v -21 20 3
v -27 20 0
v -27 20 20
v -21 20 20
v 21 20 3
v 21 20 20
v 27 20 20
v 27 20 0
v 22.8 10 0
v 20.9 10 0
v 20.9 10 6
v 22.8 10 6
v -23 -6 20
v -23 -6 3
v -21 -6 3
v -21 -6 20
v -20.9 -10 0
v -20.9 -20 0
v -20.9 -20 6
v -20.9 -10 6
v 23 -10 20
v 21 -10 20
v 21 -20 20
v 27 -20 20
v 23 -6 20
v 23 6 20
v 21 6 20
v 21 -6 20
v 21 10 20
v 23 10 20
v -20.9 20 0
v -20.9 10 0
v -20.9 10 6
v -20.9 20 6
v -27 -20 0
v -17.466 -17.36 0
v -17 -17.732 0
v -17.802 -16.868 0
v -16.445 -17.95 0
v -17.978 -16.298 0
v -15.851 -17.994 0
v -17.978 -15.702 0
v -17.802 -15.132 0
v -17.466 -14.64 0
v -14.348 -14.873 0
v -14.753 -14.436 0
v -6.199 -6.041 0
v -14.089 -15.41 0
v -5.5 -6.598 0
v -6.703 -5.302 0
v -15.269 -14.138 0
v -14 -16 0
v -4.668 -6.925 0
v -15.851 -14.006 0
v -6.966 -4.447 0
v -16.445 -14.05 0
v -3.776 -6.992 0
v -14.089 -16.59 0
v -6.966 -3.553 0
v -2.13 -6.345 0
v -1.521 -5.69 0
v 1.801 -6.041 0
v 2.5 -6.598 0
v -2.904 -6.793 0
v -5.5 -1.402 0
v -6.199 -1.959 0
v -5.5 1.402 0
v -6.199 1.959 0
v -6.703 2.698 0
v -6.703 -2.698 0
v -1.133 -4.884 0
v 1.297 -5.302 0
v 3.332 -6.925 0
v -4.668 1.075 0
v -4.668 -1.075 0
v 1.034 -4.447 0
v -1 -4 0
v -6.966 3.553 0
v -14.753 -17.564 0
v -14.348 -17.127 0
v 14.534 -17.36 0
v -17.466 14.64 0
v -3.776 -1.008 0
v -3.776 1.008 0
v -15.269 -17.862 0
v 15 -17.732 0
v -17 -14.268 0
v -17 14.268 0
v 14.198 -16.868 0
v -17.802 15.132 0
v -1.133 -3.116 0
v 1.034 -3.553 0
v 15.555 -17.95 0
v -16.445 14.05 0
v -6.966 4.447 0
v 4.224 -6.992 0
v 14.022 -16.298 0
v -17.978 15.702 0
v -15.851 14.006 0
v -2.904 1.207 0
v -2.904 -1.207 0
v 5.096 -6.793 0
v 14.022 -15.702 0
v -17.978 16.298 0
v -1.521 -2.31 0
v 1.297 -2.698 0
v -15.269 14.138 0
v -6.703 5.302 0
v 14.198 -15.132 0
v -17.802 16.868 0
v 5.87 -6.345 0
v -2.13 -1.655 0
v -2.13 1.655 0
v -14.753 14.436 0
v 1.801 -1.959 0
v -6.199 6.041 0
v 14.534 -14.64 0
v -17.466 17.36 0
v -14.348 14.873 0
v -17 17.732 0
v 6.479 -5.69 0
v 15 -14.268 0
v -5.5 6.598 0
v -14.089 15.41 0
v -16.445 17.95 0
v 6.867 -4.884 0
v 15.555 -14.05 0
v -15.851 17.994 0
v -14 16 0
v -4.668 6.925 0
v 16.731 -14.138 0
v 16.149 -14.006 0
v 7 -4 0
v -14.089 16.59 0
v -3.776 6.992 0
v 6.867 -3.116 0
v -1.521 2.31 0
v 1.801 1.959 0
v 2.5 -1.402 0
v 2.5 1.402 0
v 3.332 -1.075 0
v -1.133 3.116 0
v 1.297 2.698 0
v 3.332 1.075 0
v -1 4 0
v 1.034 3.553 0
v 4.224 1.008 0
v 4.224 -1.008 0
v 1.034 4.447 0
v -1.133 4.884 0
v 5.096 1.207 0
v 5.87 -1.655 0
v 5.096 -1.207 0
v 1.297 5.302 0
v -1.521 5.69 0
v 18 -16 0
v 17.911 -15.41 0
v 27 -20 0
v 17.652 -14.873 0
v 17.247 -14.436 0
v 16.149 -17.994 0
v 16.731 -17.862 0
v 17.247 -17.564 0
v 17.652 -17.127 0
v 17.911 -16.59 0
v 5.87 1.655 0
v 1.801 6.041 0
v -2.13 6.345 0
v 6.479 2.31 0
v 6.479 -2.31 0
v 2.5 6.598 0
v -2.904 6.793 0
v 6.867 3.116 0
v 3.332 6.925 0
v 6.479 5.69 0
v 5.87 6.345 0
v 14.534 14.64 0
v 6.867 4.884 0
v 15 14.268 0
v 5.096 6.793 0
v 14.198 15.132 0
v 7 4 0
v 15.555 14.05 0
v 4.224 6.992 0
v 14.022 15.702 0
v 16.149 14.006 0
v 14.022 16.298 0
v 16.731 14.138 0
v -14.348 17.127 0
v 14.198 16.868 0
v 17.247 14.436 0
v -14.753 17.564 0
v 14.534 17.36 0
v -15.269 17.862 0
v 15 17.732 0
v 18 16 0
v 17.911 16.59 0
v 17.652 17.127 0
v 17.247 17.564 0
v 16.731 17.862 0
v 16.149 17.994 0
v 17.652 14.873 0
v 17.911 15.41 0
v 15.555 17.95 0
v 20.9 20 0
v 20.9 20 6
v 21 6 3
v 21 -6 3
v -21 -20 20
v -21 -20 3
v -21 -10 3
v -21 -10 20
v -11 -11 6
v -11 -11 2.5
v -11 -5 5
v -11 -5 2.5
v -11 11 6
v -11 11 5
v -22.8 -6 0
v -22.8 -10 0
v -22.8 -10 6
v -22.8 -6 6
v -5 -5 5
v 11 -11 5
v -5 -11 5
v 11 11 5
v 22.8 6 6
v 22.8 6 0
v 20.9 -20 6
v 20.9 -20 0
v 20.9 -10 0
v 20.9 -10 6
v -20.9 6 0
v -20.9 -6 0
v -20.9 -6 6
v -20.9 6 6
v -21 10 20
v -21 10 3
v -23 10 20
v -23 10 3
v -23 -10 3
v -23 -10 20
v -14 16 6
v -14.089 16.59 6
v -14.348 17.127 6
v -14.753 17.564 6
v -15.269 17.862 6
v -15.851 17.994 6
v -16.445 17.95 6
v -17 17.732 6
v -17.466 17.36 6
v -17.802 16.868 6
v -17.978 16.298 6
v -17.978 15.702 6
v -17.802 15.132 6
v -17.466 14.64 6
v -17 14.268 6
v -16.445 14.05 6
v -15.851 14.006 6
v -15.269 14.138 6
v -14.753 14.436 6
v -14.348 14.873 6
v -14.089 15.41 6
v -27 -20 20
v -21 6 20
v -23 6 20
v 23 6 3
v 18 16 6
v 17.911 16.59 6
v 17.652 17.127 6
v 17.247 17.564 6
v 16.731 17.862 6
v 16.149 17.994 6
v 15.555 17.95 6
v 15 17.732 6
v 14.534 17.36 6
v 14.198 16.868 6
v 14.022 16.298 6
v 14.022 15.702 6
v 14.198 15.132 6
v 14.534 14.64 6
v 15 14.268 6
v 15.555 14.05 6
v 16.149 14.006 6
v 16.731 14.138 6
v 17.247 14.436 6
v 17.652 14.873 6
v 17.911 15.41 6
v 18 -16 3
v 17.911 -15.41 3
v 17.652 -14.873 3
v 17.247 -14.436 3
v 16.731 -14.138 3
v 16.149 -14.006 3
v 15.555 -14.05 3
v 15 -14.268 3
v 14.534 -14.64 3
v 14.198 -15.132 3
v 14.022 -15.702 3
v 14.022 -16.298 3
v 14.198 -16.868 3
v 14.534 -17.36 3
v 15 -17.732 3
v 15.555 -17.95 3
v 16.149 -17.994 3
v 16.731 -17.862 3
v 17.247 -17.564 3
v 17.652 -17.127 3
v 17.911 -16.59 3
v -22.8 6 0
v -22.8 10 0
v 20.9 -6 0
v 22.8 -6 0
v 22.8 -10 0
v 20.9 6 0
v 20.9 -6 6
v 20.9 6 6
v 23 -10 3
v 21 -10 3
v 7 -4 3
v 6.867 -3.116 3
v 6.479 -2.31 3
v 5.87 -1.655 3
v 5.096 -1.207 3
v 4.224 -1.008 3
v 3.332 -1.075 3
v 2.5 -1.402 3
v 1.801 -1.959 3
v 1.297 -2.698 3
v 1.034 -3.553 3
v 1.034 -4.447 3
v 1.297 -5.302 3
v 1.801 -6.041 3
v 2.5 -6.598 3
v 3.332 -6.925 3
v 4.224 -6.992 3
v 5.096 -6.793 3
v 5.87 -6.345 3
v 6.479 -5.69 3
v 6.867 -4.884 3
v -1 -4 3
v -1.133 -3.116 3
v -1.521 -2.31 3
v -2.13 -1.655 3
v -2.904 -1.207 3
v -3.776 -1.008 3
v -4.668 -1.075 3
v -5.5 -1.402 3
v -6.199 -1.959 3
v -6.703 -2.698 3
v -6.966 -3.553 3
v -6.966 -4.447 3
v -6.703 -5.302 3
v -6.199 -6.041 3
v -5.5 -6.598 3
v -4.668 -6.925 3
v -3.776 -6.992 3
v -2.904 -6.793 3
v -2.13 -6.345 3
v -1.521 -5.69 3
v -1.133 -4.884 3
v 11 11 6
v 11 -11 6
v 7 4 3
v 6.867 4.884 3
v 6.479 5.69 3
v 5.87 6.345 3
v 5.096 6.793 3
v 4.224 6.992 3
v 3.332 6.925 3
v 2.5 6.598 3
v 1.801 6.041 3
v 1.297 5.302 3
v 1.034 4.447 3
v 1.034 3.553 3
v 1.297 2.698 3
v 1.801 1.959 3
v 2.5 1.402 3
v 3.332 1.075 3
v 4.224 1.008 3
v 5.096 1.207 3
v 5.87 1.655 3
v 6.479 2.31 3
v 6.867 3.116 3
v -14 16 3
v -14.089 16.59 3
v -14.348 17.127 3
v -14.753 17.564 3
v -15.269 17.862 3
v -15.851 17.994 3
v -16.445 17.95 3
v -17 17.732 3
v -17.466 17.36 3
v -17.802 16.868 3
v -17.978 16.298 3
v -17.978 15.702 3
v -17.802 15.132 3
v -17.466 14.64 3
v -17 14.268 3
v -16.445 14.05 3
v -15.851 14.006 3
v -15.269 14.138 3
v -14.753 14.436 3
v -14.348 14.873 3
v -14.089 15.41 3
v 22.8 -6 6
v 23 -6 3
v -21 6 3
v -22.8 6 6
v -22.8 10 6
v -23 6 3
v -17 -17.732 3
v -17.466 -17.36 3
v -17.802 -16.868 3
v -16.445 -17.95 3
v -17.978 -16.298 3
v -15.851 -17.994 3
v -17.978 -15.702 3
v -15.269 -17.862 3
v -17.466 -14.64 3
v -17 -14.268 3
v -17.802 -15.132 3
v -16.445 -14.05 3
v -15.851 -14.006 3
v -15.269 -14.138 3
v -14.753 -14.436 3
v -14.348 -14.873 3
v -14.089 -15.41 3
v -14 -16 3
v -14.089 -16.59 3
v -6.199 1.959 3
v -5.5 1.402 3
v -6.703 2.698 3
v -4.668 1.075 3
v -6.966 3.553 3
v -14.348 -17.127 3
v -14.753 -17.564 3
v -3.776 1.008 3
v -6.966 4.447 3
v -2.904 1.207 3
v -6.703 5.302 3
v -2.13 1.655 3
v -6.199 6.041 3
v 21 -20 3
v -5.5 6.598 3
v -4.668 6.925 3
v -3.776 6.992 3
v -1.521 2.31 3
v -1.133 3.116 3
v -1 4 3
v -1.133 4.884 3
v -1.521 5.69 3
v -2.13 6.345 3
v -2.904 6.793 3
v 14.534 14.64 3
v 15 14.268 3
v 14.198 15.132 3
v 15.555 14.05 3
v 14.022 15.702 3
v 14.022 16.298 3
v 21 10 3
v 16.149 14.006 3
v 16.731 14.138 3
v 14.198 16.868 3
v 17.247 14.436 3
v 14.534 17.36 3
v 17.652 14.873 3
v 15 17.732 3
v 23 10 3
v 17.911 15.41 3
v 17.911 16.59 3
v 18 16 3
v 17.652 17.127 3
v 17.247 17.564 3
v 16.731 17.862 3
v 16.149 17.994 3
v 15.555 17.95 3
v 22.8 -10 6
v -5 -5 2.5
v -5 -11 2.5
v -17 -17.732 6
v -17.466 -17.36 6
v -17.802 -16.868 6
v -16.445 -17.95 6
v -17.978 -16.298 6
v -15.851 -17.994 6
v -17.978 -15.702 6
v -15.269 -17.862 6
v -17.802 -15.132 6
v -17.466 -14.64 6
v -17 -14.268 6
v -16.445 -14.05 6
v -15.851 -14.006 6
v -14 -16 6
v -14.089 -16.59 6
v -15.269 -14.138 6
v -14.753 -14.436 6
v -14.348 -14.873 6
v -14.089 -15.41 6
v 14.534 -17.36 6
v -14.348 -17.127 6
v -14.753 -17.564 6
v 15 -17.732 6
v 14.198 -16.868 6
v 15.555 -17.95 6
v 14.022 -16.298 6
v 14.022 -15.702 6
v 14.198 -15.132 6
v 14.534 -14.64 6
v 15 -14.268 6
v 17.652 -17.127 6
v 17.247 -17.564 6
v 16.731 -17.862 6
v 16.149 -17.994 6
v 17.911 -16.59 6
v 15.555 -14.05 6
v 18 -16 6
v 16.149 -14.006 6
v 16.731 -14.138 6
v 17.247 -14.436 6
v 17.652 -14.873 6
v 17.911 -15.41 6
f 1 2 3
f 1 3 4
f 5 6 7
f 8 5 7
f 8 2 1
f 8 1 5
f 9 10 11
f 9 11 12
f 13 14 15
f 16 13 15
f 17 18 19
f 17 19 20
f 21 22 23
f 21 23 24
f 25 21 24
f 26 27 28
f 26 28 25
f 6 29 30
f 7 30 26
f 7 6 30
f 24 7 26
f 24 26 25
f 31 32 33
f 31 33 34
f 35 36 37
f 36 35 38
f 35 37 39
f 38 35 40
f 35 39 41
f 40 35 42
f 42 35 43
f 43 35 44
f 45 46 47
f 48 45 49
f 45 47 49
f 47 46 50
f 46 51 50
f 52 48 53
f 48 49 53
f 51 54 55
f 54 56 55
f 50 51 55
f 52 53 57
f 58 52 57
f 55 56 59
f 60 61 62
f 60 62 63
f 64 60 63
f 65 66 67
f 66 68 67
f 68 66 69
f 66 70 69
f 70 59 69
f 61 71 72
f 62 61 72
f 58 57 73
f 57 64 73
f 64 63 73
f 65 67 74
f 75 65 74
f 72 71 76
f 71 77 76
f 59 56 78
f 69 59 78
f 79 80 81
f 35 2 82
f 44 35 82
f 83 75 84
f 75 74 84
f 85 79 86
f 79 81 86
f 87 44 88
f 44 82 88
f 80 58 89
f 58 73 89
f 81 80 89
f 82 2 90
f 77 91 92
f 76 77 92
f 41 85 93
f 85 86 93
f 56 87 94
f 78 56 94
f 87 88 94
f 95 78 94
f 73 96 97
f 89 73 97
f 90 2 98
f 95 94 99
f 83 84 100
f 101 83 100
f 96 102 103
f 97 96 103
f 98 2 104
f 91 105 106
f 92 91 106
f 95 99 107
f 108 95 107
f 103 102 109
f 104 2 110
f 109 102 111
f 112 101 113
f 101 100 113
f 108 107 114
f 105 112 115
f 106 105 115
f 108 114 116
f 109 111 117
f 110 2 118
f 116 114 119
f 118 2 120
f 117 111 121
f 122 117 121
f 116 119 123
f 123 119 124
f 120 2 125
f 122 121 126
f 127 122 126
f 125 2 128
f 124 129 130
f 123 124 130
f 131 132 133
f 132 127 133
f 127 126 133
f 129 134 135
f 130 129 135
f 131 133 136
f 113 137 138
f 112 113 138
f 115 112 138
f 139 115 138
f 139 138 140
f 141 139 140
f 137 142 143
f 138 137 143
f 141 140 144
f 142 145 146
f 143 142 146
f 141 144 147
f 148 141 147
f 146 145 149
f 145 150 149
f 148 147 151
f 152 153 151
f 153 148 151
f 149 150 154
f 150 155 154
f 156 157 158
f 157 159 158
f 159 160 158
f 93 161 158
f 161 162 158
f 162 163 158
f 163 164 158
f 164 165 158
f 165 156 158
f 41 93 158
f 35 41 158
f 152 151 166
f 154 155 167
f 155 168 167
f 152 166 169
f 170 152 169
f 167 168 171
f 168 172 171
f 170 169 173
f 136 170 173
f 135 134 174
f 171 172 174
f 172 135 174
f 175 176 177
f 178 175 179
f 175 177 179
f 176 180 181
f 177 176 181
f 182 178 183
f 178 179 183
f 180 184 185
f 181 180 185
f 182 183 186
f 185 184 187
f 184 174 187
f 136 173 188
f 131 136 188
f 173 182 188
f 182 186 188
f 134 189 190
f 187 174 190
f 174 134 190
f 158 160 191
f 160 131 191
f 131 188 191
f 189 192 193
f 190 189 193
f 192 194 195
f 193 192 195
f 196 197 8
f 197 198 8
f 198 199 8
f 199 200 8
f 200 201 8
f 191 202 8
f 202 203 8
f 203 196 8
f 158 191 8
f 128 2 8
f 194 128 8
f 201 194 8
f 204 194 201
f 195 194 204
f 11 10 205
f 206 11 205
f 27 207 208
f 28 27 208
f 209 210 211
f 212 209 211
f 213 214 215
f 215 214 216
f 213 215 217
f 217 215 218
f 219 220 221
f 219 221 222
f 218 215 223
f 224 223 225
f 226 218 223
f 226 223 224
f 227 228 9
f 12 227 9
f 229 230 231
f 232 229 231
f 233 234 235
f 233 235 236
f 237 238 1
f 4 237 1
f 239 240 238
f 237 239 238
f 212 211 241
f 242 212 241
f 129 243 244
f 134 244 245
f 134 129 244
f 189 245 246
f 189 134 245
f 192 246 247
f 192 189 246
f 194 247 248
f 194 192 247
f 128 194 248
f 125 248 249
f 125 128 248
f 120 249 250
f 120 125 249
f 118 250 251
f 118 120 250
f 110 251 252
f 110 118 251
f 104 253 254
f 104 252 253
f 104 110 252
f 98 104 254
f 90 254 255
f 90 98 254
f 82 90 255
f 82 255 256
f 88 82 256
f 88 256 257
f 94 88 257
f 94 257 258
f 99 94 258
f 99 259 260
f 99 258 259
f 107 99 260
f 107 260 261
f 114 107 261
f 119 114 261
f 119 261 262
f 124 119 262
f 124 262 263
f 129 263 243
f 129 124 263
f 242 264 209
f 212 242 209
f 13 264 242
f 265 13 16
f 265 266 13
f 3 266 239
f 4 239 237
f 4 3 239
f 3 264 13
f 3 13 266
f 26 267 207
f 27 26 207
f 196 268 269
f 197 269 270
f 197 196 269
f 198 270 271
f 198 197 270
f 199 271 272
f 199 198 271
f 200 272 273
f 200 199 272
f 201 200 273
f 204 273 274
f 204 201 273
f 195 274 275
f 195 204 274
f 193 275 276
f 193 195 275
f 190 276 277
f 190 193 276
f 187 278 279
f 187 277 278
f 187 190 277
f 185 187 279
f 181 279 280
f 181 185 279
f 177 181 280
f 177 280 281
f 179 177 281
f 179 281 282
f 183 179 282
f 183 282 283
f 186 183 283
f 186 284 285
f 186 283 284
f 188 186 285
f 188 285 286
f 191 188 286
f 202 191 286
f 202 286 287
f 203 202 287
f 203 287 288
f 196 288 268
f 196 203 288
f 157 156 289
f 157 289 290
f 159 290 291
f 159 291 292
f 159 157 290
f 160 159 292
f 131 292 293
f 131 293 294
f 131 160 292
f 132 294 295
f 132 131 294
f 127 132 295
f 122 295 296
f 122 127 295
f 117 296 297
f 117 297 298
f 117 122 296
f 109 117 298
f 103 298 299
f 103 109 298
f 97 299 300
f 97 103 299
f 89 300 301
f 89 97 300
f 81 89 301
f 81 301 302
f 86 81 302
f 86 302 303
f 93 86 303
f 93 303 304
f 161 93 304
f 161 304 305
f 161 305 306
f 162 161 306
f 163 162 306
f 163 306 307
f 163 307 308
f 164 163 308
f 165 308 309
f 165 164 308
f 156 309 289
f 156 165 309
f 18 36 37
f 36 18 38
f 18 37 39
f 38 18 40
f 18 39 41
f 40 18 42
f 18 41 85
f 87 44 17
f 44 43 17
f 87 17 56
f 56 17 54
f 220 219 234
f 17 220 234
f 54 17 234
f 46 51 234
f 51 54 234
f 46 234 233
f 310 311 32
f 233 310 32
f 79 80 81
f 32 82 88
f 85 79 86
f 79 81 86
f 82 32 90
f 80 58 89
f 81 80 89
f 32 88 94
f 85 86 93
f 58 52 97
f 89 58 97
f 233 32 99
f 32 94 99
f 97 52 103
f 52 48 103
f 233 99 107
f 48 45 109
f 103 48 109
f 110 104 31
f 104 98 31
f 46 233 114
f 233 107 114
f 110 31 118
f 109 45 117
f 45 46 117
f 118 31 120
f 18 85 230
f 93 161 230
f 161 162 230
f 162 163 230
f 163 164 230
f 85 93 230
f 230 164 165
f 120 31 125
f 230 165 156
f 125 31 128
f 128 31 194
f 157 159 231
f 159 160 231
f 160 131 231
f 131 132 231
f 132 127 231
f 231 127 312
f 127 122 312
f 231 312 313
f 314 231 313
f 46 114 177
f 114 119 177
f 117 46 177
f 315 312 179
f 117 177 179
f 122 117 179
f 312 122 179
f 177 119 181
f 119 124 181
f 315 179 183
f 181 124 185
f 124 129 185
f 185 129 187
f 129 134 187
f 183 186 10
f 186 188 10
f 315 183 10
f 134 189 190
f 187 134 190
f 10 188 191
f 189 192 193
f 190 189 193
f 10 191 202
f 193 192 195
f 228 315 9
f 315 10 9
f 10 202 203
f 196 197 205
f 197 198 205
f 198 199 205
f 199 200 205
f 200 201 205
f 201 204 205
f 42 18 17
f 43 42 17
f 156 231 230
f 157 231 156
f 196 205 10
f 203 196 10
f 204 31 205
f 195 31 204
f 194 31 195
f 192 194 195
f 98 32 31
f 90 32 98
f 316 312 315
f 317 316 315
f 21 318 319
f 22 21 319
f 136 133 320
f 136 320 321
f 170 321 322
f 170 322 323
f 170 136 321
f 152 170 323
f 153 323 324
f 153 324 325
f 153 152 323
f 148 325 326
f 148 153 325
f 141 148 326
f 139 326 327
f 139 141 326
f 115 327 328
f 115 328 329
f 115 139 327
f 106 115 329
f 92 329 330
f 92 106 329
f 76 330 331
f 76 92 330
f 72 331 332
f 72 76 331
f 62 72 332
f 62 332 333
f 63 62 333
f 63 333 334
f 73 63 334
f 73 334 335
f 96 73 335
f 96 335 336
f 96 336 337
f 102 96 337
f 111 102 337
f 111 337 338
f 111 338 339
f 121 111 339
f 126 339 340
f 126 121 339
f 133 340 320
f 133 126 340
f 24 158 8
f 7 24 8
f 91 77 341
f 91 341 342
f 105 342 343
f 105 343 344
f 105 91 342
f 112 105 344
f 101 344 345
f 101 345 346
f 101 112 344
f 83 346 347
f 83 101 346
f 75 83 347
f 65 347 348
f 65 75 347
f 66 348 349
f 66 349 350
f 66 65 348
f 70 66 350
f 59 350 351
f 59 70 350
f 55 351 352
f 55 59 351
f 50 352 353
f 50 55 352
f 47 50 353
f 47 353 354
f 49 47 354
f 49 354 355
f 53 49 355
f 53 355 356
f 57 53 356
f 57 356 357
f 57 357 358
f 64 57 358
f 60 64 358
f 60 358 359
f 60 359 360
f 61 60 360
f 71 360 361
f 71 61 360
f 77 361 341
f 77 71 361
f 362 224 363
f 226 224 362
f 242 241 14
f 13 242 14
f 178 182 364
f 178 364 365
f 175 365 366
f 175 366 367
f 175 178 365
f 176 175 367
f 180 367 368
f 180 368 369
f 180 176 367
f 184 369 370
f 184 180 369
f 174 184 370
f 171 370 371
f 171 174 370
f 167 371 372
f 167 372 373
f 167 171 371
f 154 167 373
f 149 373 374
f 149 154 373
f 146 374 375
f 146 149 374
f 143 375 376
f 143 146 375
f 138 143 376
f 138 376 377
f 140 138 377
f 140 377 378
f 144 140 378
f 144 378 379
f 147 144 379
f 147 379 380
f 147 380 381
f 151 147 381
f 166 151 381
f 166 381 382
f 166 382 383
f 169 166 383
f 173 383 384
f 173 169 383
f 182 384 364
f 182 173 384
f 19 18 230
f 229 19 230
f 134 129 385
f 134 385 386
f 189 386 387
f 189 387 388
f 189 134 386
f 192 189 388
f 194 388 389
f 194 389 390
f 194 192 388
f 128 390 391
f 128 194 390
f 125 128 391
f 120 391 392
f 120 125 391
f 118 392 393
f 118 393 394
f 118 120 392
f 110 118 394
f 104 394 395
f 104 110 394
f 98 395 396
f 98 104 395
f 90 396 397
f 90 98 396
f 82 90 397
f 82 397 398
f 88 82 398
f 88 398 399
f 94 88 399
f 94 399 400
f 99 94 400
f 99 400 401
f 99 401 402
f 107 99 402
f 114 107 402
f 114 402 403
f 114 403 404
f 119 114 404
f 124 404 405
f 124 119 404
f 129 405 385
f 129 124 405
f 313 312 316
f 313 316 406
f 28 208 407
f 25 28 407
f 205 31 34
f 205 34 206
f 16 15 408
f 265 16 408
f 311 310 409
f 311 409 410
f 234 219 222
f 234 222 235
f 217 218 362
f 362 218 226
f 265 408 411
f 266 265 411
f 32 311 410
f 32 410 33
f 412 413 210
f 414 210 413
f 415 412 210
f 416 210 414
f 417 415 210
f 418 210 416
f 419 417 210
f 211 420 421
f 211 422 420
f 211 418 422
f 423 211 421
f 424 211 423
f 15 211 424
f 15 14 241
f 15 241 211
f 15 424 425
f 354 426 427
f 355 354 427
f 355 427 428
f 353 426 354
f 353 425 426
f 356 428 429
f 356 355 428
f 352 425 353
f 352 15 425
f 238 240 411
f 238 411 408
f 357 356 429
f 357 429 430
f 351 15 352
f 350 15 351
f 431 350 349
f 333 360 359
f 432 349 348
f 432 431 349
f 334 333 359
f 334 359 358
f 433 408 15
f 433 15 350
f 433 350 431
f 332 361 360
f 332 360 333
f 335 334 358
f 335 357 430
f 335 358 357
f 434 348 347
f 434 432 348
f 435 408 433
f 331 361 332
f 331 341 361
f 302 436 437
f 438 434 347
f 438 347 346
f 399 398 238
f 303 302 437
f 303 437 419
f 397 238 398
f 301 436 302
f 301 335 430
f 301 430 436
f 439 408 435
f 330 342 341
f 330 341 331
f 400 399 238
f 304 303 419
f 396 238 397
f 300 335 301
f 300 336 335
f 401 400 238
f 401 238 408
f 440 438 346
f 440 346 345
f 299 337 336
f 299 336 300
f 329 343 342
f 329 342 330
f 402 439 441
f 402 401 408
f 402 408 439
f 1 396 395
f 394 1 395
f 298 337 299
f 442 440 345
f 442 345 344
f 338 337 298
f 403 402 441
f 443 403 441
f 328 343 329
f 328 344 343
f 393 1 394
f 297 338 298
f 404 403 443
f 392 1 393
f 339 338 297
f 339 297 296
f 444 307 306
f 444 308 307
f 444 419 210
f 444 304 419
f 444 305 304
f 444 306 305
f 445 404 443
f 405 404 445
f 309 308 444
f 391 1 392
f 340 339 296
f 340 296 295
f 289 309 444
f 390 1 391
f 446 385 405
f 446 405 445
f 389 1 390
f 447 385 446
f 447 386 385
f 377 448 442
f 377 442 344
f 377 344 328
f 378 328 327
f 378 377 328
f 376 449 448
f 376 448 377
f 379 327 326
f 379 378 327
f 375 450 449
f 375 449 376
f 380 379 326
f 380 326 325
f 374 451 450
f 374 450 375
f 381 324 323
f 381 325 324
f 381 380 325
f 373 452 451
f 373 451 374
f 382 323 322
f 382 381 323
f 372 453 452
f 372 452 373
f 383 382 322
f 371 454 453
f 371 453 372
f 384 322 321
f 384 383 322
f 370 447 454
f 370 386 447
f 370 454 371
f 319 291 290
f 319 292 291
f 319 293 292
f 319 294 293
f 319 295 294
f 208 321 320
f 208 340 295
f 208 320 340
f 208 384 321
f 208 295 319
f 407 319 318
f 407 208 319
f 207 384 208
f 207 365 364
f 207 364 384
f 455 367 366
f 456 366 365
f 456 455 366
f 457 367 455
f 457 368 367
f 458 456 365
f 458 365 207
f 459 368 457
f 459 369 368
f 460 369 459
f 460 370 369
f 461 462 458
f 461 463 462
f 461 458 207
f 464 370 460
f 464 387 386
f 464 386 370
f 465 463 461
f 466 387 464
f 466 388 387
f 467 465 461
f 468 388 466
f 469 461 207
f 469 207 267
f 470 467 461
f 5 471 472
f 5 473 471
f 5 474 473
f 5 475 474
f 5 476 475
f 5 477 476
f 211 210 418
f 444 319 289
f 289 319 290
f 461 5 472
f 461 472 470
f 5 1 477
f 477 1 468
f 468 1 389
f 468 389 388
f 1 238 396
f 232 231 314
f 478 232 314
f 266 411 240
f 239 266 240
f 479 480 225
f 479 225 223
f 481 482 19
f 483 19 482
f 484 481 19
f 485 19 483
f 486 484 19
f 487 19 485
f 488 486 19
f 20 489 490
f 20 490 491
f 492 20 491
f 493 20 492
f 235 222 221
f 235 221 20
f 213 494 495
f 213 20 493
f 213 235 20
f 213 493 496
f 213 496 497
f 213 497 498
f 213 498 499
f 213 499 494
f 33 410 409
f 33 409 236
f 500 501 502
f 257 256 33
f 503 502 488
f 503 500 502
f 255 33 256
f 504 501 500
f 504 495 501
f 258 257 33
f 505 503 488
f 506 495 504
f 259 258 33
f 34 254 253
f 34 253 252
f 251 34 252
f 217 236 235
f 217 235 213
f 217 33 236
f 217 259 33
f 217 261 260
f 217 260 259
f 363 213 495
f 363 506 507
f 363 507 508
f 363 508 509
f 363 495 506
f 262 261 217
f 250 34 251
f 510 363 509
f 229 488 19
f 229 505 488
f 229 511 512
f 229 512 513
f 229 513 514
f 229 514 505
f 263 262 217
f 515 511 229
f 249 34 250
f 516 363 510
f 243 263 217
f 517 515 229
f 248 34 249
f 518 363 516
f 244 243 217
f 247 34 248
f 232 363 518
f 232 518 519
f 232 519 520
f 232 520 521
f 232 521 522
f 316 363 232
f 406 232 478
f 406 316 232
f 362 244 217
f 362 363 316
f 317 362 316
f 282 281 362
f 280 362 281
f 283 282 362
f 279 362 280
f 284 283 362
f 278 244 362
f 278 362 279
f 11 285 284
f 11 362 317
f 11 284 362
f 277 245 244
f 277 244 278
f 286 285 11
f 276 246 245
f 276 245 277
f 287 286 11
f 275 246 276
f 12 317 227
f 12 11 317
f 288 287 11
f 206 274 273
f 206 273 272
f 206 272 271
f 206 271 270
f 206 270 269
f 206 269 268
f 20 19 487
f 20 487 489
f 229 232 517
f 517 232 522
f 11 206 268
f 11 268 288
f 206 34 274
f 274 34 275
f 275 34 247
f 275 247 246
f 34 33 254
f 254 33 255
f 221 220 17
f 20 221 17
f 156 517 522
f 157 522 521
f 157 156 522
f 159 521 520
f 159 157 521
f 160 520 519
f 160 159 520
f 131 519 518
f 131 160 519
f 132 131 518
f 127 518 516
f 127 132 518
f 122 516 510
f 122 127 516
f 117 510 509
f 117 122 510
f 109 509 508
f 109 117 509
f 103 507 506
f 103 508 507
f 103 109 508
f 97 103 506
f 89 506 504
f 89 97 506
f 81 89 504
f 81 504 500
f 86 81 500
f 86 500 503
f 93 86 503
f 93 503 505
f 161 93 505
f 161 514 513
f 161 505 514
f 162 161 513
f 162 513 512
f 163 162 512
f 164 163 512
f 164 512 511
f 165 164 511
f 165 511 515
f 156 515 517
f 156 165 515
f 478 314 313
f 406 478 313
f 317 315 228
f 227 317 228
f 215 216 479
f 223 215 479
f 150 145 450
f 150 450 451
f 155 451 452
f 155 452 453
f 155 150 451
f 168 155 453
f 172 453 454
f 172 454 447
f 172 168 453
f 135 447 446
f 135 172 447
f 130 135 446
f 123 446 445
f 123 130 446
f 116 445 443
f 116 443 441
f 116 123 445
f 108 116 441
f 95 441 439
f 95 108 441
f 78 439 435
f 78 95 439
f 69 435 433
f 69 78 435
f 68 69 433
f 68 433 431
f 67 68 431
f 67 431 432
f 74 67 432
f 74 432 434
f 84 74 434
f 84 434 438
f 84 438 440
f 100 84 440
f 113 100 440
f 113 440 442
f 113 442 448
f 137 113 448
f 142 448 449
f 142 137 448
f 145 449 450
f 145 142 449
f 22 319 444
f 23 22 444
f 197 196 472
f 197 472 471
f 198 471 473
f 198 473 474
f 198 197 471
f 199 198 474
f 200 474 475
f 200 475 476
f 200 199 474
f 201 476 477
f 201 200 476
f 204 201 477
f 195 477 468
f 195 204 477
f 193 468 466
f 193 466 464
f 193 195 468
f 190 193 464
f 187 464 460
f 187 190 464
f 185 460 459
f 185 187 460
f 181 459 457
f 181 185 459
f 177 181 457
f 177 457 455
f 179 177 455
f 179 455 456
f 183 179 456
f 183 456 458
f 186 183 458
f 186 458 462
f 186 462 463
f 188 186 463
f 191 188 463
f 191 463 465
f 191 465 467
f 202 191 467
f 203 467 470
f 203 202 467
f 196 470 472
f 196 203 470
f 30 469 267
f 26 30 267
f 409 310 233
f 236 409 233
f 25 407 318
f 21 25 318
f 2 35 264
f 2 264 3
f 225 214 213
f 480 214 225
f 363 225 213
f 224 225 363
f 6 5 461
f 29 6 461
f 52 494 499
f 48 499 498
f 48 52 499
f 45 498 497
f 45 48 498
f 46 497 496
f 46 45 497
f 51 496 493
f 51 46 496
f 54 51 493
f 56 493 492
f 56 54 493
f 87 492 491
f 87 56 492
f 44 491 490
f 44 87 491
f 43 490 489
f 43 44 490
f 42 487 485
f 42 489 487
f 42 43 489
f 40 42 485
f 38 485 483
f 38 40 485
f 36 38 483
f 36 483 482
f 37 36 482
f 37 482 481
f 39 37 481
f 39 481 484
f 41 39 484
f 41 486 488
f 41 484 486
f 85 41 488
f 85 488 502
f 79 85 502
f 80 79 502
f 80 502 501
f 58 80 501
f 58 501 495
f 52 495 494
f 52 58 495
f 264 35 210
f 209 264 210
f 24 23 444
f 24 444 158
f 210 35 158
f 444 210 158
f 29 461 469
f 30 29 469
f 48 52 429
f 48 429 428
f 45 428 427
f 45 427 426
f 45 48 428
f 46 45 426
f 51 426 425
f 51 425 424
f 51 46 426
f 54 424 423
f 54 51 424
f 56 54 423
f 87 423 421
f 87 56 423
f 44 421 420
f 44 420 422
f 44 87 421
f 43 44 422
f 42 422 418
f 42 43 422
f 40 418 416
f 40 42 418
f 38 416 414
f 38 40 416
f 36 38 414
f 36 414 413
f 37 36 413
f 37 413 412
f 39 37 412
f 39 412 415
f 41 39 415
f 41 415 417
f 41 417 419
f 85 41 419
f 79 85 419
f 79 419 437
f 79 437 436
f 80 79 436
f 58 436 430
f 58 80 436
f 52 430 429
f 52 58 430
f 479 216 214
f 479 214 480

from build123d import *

# Parameters (mm, degrees)
F0_W      = 54
F0_H      = 40
F0_R      = 2
F0_R_2    = 3
F1_DEPTH  = 3
F3_DEPTH  = 20
F4_W      = 41.8
F4_H      = 40
F5_DEPTH  = 6
F7_START  = 5
F6_W      = 22
F6_H      = 22
F7_DEPTH  = 1
F9_START  = 2.5
F8_W      = 6
F8_H      = 6
F9_DEPTH  = 2.5
F12_R     = 2
F13_DEPTH = 25
F14_W     = 2
F14_H     = 4
F15_DEPTH = 6


# Not quite as in the source:
# - a feature of the source that left no trace in its solid (it failed there, or was rolled back) is left out


with BuildPart() as f1:
    # F0 (on Top) → F1 (new body)
    with BuildSketch(Plane.XY):
        Rectangle(F0_W, F0_H)
        with Locations((-16, -16)):
            Circle(F0_R, mode=Mode.SUBTRACT)
        with Locations((-4, -4)):
            Circle(F0_R_2, mode=Mode.SUBTRACT)
        with Locations((16, -16)):
            Circle(F0_R, mode=Mode.SUBTRACT)
        with Locations((4, -4)):
            Circle(F0_R_2, mode=Mode.SUBTRACT)
        with Locations((-4, 4)):
            Circle(F0_R_2, mode=Mode.SUBTRACT)
        with Locations((-16, 16)):
            Circle(F0_R, mode=Mode.SUBTRACT)
        with Locations((4, 4)):
            Circle(F0_R_2, mode=Mode.SUBTRACT)
        with Locations((16, 16)):
            Circle(F0_R, mode=Mode.SUBTRACT)
    extrude(amount=F1_DEPTH)

    # F2 (on Top) → F3 (join)
    with BuildSketch(Plane.XY):
        Polygon((-27, 12.5), (-27, -20), (-21, -20), (-21, -10), (-23, -10), (-23, -6), (-21, -6), (-21, 6), (-23, 6), (-23, 10), (-21, 10), (-21, 20), (-27, 20), align=None)
        Polygon((27, 20), (21, 20), (21, 10), (23, 10), (23, 6), (21, 6), (21, -6), (23, -6), (23, -10), (21, -10), (21, -20), (27, -20), align=None)
    extrude(amount=F3_DEPTH)


with BuildPart() as f5:
    # F4 (on Top) → F5 (new body)
    with BuildSketch(Plane.XY):
        Rectangle(F4_W, F4_H)
    extrude(amount=F5_DEPTH)

    # F6 (on Top) → F7 (cut)
    with BuildSketch(Plane.XY.offset(F7_START)):
        Rectangle(F6_W, F6_H)
    extrude(amount=F7_DEPTH, mode=Mode.SUBTRACT)

    # F8 (on Top) → F9 (cut)
    with BuildSketch(Plane.XY.offset(F9_START)):
        with Locations((-8, -8)):
            Rectangle(F8_W, F8_H)
    extrude(amount=F9_DEPTH, mode=Mode.SUBTRACT)

    # F12 (on Top) → F13 (cut)
    with BuildSketch(Plane.XY):
        with Locations((-16, 16)):
            Circle(F12_R)
        with Locations((16, 16)):
            Circle(F12_R)
        with Locations((16, -16)):
            Circle(F12_R)
        with Locations((-16, -16)):
            Circle(F12_R)
    extrude(amount=F13_DEPTH, mode=Mode.SUBTRACT)

    # F14 (on Top) → F15 (join)
    with BuildSketch(Plane.XY):
        with Locations((-21.8, 8)):
            Rectangle(F14_W, F14_H)
        with Locations((-21.8, -8)):
            Rectangle(F14_W, F14_H)
        with Locations((21.8, 8)):
            Rectangle(F14_W, F14_H)
        with Locations((21.8, -8)):
            Rectangle(F14_W, F14_H)
    extrude(amount=F15_DEPTH)


solid = Compound([f1.part, f5.part])
